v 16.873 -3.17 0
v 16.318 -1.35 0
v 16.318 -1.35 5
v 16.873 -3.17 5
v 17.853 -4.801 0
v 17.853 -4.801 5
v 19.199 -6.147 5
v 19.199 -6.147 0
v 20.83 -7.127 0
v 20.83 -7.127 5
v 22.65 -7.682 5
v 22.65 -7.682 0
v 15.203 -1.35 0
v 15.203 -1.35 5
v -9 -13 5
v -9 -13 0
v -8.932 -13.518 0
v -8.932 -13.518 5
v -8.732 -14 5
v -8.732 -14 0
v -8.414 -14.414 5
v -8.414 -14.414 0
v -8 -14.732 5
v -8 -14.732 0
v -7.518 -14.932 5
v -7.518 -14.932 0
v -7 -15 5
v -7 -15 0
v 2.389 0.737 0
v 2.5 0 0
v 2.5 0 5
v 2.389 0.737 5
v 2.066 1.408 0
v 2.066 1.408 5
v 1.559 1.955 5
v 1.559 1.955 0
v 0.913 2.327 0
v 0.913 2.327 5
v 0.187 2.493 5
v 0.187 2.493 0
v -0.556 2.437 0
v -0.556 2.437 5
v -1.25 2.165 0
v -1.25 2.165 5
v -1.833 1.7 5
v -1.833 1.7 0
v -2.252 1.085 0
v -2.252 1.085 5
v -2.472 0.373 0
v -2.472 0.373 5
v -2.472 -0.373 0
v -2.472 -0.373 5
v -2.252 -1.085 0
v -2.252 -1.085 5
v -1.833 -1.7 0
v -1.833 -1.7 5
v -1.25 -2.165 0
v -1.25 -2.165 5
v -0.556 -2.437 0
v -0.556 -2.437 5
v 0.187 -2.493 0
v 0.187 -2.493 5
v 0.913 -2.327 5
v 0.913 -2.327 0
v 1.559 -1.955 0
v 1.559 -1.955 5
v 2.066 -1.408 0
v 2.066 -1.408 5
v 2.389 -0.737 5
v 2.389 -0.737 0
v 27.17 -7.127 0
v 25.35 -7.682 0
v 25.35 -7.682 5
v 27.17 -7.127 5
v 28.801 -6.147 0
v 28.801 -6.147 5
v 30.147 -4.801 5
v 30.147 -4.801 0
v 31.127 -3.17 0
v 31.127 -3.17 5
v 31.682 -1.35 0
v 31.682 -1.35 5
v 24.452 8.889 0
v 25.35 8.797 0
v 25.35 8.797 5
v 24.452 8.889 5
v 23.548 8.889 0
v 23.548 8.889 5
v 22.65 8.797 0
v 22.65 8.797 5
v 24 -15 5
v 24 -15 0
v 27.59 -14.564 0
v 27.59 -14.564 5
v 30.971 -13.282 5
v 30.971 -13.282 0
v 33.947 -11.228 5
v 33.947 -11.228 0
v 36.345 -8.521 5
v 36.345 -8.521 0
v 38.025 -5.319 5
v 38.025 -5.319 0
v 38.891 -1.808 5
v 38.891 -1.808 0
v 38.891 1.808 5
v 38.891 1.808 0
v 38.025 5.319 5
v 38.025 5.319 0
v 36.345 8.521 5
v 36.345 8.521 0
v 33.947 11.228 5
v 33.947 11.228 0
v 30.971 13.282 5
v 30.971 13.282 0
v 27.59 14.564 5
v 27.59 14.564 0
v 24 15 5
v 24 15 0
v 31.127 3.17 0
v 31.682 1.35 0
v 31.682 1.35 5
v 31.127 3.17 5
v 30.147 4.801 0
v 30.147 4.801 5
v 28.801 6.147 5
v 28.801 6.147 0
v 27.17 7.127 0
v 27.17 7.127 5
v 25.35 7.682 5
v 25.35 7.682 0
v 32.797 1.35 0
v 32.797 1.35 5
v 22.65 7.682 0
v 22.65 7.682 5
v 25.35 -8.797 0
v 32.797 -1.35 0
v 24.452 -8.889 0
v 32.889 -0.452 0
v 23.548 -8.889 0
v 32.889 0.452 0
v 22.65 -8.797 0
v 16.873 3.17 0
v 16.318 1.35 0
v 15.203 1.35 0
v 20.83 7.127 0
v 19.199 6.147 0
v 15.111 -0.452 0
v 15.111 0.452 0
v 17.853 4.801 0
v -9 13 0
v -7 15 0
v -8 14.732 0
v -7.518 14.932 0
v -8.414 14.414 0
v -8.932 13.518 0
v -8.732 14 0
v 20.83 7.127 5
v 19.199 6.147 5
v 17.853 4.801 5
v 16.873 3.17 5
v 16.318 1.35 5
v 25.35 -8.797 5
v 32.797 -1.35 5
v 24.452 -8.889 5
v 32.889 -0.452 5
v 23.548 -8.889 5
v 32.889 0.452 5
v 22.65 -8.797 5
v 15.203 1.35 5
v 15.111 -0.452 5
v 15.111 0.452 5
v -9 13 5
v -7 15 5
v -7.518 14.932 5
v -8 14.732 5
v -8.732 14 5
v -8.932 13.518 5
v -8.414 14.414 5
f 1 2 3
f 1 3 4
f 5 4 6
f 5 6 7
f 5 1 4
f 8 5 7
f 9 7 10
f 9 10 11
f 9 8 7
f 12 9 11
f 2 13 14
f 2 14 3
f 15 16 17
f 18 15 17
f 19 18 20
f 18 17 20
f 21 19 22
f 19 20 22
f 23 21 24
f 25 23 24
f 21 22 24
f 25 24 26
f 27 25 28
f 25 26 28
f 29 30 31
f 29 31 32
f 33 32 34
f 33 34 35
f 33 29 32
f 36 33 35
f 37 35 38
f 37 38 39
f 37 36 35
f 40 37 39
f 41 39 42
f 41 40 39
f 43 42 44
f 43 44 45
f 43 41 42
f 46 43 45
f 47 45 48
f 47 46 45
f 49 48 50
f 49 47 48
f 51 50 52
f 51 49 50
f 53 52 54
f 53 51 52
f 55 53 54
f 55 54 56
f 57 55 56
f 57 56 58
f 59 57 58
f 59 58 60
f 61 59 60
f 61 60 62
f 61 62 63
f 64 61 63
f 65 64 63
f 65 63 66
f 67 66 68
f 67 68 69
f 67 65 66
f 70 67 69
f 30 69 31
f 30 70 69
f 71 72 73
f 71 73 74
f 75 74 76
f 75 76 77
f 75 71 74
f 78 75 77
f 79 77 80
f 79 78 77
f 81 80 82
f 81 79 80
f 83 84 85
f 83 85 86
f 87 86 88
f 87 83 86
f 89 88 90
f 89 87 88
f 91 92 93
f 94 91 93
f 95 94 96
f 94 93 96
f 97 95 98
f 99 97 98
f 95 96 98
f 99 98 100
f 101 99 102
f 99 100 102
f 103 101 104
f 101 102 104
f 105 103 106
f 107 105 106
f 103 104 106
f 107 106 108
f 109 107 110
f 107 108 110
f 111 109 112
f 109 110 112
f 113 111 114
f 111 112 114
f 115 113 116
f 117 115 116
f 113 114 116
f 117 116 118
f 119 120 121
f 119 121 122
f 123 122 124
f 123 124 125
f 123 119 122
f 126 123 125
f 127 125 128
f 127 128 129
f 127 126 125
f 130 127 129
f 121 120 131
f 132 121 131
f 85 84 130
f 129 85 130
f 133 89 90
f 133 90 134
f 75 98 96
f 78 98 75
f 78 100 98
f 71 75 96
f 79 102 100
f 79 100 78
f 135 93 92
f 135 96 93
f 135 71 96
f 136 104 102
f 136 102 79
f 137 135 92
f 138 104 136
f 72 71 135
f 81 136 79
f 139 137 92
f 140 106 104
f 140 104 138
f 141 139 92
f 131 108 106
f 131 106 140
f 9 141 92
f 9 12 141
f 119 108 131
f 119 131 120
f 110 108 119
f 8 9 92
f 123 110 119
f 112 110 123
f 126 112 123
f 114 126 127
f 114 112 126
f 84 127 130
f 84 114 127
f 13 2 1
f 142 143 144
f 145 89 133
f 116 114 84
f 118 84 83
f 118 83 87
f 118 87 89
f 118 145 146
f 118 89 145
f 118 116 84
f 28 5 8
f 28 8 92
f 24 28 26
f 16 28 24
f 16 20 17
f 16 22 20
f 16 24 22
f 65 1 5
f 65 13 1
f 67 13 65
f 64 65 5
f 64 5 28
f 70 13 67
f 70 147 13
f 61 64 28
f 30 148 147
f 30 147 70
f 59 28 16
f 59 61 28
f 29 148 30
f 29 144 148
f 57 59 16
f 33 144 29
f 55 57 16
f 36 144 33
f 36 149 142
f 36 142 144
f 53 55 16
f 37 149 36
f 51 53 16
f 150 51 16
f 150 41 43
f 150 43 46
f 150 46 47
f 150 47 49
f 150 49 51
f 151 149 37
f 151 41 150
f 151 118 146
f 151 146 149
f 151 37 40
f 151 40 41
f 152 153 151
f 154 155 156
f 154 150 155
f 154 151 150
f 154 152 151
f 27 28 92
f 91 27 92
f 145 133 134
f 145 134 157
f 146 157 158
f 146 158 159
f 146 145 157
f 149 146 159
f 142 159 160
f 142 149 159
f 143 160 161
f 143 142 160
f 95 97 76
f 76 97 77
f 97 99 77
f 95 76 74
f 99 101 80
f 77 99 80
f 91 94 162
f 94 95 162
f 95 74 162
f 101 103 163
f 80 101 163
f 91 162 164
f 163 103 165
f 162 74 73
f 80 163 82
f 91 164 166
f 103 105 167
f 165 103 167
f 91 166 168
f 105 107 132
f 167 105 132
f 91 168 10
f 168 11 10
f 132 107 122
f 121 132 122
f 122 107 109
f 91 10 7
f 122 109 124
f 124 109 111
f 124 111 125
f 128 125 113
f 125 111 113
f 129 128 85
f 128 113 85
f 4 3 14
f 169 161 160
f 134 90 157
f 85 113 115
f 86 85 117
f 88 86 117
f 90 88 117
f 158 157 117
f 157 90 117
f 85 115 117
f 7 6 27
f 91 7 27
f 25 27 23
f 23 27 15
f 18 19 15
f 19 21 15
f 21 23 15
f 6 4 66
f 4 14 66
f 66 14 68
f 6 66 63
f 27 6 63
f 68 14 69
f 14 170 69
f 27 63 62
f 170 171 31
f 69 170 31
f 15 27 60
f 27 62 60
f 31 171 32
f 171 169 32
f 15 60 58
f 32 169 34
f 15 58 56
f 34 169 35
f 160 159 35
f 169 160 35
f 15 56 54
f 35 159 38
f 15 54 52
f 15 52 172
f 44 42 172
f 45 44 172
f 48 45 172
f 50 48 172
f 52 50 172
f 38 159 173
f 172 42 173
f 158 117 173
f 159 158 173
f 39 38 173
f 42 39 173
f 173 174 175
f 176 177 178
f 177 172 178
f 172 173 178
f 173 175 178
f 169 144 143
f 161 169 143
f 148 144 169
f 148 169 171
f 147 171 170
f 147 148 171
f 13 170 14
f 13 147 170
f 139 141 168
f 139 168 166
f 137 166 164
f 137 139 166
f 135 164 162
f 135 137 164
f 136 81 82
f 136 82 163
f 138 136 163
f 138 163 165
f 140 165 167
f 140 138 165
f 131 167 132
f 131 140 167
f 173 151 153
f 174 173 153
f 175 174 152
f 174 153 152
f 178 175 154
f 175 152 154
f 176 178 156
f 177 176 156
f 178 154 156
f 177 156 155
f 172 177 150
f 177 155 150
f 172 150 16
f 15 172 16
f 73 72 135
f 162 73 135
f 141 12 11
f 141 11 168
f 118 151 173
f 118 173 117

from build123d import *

# Parameters (mm, degrees)
SKETCH_R  = 2.5
PAD_DEPTH = 5


with BuildPart() as part:
    # Sketch → Pad (new body)
    with BuildSketch(Plane.XY):
        with BuildLine():
            Line((-7, 15), (24, 15))
            ThreePointArc((24, -15), (39, 0), (24, 15))
            Line((-7, -15), (24, -15))
            ThreePointArc((-9, -13), (-8.414214, -14.414214), (-7, -15))
            Line((-9, 13), (-9, -13))
            ThreePointArc((-7, 15), (-8.414214, 14.414214), (-9, 13))
        make_face()
        Circle(SKETCH_R, mode=Mode.SUBTRACT)
        with BuildLine():
            ThreePointArc((16.317715, -1.35), (18.484567, -5.515433), (22.65, -7.682285))
            Line((22.65, -7.682285), (22.65, -8.797017))
            ThreePointArc((22.65, -8.797017), (24, -8.9), (25.35, -8.797017))
            Line((25.35, -7.682285), (25.35, -8.797017))
            ThreePointArc((25.35, -7.682285), (29.515433, -5.515433), (31.682285, -1.35))
            Line((31.682285, -1.35), (32.797017, -1.35))
            ThreePointArc((32.797017, -1.35), (32.9, 0), (32.797017, 1.35))
            Line((31.682285, 1.35), (32.797017, 1.35))
            ThreePointArc((31.682285, 1.35), (29.515433, 5.515433), (25.35, 7.682285))
            Line((25.35, 8.797017), (25.35, 7.682285))
            ThreePointArc((25.35, 8.797017), (24, 8.9), (22.65, 8.797017))
            Line((22.65, 8.797017), (22.65, 7.682285))
            ThreePointArc((22.65, 7.682285), (18.484567, 5.515433), (16.317715, 1.35))
            Line((15.202983, 1.35), (16.317715, 1.35))
            ThreePointArc((15.202983, 1.35), (15.1, 0), (15.202983, -1.35))
            Line((15.202983, -1.35), (16.317715, -1.35))
        make_face(mode=Mode.SUBTRACT)
    extrude(amount=PAD_DEPTH)


solid = part.part
